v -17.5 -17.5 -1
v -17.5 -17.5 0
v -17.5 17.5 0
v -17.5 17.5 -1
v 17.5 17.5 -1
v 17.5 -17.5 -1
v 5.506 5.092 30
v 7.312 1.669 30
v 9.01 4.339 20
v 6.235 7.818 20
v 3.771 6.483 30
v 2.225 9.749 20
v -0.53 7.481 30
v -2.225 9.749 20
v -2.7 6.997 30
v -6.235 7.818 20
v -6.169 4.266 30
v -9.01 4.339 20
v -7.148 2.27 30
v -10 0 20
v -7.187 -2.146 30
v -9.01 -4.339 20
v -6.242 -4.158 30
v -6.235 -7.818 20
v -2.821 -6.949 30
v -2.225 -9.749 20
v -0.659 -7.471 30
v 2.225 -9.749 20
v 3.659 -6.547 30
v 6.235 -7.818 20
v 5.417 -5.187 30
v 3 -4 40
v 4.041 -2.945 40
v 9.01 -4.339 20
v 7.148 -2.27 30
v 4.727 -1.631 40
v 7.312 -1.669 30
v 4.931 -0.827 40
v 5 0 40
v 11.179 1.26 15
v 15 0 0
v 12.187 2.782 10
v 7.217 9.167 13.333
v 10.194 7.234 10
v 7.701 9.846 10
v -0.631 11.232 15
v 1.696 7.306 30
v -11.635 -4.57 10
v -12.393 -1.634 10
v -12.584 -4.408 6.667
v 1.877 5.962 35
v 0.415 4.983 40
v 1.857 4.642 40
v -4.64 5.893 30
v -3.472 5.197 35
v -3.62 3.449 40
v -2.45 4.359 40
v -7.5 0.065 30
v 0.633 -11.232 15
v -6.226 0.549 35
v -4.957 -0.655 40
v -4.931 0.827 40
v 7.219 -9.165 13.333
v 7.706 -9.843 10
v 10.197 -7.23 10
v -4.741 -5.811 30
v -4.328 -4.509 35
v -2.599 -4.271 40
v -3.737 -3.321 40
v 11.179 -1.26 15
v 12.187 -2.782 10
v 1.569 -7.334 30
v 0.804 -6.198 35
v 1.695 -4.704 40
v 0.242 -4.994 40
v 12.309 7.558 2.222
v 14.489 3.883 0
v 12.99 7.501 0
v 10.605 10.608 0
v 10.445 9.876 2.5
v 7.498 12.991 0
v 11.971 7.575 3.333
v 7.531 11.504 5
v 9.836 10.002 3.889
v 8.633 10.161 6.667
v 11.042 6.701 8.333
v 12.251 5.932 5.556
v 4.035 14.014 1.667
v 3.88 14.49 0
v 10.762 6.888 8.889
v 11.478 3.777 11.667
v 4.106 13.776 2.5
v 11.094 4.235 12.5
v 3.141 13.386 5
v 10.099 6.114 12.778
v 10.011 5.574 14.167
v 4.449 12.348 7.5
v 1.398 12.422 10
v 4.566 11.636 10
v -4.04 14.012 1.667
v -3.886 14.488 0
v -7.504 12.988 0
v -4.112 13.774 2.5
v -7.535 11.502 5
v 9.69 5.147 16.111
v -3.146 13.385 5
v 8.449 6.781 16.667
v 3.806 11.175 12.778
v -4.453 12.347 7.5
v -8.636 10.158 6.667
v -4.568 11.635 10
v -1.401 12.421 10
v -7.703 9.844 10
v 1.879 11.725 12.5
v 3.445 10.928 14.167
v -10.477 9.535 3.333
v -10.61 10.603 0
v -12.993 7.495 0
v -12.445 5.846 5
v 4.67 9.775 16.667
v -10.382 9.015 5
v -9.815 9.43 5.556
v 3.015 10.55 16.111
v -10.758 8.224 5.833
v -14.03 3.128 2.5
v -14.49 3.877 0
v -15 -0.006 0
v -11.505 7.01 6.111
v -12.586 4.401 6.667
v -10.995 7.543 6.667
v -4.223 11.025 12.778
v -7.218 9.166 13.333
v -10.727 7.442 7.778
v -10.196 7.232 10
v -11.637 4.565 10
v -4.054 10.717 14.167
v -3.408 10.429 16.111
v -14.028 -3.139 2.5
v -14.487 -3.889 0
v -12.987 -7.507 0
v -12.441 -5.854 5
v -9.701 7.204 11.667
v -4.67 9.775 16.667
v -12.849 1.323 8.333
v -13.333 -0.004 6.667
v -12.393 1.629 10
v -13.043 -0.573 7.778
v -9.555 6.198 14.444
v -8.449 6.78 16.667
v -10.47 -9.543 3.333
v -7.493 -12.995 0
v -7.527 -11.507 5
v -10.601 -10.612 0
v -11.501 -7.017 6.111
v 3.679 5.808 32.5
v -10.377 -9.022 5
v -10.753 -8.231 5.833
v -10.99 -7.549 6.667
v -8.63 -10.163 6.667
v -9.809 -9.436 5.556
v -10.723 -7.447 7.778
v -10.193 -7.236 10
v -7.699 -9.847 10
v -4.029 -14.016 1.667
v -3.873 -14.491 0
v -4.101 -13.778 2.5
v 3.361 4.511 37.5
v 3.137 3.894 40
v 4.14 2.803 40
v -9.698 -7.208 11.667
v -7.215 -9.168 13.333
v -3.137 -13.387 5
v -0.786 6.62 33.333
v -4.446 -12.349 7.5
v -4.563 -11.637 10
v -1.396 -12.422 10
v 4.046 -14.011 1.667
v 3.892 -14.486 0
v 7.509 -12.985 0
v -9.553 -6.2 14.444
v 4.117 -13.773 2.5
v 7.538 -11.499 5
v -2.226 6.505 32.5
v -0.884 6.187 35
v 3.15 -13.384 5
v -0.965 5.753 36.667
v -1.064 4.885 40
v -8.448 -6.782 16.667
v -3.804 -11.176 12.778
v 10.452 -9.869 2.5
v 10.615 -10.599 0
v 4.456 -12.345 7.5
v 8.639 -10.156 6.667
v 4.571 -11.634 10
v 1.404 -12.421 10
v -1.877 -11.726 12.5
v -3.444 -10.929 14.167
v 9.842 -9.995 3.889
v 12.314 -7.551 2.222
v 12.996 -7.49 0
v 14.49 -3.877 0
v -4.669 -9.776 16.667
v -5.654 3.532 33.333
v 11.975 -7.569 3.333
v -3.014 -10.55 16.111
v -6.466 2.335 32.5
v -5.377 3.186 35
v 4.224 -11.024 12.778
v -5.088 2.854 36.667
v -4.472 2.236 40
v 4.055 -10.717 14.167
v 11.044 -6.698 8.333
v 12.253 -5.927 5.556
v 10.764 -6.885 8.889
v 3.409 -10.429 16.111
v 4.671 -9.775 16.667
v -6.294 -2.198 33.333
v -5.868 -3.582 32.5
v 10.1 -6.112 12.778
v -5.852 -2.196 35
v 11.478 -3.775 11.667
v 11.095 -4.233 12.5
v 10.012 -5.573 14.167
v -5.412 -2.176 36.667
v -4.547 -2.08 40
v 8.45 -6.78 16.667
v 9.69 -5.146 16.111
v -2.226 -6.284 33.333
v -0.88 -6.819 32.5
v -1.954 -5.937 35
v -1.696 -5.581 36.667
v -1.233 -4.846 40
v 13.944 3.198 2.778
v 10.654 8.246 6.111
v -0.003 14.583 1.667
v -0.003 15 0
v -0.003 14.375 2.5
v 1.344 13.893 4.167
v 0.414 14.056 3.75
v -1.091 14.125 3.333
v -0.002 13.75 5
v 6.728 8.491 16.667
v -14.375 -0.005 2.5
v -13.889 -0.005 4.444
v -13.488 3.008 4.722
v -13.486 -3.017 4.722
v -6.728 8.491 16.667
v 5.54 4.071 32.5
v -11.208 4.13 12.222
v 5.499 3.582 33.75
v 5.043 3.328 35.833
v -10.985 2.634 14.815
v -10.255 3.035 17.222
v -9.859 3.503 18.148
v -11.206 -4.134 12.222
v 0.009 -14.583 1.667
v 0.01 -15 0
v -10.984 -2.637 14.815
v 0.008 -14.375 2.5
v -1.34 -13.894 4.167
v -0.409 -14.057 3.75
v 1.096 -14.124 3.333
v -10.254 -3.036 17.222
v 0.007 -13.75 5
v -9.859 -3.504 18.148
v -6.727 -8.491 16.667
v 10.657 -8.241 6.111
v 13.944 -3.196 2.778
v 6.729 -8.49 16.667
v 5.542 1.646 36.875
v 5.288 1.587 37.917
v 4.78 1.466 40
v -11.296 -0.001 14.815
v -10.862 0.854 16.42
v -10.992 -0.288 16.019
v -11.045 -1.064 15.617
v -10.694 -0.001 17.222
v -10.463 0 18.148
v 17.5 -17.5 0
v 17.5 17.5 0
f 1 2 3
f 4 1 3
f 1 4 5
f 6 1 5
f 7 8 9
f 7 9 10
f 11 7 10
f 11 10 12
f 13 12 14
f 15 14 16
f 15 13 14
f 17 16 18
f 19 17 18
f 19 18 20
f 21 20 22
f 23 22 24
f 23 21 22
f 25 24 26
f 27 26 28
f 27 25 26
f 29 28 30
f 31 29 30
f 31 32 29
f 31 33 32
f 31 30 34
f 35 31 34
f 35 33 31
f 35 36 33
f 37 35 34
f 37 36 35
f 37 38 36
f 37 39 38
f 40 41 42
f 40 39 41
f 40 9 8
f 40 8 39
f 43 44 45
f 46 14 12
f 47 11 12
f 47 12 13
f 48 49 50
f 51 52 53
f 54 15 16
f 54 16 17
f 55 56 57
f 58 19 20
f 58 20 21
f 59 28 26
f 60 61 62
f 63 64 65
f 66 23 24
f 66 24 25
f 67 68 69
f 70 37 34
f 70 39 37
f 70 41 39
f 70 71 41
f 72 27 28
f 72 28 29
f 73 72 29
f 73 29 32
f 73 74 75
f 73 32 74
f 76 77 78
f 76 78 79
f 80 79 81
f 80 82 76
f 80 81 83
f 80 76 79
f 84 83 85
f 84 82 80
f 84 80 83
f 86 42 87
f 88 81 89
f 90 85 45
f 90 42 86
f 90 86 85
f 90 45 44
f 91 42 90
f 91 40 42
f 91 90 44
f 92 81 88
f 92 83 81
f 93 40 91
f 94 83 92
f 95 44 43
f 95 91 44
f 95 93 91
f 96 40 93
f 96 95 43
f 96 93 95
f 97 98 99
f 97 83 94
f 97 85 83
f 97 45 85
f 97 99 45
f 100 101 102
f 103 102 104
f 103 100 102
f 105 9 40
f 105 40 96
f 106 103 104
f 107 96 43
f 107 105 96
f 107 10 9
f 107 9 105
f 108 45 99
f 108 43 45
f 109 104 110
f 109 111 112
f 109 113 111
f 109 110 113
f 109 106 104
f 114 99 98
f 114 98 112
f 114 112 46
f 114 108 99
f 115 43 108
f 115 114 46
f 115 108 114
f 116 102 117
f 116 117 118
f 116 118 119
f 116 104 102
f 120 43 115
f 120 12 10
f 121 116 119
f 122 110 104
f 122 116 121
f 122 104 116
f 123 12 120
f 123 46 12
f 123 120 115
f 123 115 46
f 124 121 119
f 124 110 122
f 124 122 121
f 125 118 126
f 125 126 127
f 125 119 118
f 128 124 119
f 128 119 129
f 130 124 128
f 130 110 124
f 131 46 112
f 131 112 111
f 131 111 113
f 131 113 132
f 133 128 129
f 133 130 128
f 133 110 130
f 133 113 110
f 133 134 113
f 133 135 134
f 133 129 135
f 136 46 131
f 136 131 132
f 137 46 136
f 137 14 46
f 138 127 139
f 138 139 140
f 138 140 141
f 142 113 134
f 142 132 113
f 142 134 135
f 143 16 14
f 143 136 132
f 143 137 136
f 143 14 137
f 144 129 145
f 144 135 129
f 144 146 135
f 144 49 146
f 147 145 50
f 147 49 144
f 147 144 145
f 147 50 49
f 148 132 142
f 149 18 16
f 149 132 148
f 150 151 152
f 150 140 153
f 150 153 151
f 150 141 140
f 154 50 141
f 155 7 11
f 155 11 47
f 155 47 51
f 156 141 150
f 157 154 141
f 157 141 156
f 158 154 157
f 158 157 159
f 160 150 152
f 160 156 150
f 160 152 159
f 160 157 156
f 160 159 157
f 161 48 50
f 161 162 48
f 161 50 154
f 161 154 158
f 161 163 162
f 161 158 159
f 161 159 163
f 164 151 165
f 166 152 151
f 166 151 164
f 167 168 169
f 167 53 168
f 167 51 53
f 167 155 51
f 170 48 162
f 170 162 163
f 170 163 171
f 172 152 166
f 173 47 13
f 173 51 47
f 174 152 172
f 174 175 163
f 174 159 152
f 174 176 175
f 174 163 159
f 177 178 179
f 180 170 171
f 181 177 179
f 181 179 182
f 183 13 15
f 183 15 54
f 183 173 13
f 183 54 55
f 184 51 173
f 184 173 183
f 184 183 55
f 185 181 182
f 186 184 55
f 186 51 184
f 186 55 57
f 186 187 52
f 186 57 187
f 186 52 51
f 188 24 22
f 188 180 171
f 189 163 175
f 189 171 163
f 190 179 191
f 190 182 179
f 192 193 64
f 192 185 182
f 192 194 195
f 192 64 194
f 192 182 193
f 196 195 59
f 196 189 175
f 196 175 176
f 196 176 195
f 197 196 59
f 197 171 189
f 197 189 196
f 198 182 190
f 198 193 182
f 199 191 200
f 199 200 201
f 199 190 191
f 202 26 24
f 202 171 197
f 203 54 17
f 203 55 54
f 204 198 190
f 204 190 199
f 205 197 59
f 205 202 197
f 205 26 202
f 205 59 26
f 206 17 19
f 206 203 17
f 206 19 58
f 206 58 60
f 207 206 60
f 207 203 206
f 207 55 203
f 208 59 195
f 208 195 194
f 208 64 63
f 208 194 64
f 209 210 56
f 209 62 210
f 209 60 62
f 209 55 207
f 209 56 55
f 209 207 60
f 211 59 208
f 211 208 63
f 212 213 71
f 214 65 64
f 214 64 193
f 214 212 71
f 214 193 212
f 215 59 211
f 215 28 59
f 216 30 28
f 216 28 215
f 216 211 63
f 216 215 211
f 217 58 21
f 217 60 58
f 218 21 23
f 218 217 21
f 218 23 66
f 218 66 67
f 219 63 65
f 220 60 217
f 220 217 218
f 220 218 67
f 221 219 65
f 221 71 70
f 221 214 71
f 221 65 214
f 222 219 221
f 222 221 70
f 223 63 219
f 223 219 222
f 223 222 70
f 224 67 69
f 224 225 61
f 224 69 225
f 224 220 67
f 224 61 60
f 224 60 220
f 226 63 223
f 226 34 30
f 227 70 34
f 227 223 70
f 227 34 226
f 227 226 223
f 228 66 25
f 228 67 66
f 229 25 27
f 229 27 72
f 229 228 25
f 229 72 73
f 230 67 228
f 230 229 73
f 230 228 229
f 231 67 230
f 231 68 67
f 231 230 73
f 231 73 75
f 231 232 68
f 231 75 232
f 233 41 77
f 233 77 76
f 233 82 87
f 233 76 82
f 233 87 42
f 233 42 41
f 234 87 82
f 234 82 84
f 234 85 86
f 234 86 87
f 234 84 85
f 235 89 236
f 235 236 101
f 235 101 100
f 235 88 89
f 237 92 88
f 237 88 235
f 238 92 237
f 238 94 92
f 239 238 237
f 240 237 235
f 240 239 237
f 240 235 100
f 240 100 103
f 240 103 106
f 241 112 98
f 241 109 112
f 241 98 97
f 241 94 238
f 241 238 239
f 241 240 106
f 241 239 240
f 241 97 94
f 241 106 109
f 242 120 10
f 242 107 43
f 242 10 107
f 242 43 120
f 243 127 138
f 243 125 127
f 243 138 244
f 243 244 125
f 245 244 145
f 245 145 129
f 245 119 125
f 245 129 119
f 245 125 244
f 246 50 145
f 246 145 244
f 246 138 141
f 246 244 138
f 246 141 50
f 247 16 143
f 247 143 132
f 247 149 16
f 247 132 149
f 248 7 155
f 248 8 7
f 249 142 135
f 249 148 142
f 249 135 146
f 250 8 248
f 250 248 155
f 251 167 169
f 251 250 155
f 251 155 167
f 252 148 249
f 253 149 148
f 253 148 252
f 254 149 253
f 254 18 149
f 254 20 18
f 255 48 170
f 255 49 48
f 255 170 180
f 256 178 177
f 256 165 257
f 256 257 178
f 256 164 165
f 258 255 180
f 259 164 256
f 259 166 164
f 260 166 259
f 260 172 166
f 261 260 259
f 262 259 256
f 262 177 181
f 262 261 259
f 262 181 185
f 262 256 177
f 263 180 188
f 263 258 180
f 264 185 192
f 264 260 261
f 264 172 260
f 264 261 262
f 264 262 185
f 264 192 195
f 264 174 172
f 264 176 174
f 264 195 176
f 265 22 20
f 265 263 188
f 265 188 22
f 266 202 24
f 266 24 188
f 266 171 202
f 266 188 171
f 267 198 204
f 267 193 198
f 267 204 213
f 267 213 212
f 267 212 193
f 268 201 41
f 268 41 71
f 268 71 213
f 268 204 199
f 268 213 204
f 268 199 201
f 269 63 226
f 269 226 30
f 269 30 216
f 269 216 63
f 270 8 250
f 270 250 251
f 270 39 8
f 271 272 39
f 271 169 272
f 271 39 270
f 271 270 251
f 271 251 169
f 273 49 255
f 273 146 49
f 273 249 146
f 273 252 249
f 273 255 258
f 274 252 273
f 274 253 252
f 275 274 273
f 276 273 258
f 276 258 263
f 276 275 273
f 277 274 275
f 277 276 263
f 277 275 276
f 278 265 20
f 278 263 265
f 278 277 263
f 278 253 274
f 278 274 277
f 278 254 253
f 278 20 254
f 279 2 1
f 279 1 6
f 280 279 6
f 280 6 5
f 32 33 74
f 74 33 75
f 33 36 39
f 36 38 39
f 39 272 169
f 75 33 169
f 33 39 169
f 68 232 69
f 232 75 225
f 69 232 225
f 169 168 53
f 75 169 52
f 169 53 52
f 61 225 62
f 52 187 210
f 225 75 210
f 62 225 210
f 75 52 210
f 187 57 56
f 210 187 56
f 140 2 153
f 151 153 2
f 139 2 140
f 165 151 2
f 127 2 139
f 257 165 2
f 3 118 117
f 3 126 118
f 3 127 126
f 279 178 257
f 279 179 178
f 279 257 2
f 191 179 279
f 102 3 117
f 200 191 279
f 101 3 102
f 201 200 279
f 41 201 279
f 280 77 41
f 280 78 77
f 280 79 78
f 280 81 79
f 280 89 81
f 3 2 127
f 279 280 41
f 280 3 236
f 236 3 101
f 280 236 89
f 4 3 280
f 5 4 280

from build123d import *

# Parameters (mm, degrees)
F0_R      = 15
F2_R      = 12.5
F4_R      = 10
F6_R      = 7.5
F8_R      = 5
F10_W     = 35
F10_H     = 35
F11_DEPTH = 1


with BuildPart() as f9:
    # F0 (on Top) → F9 section 0
    with BuildSketch(Plane.XY):
        Circle(F0_R)
    # F2 (on offset) → F9 section 1
    with BuildSketch(Plane.XY.offset(10)):
        Circle(F2_R)
    # F4 (on offset) → F9 section 2
    with BuildSketch(Plane.XY.offset(20)):
        Circle(F4_R)
    # F6 (on offset) → F9 section 3
    with BuildSketch(Plane.XY.offset(30)):
        Circle(F6_R)
    # F8 (on offset) → F9 section 4
    with BuildSketch(Plane.XY.offset(40)):
        Circle(F8_R)
    loft()

    # F10 (on Top) → F11 (join)
    with BuildSketch(Plane.XY):
        Rectangle(F10_W, F10_H)
    extrude(amount=-F11_DEPTH)


solid = f9.part
